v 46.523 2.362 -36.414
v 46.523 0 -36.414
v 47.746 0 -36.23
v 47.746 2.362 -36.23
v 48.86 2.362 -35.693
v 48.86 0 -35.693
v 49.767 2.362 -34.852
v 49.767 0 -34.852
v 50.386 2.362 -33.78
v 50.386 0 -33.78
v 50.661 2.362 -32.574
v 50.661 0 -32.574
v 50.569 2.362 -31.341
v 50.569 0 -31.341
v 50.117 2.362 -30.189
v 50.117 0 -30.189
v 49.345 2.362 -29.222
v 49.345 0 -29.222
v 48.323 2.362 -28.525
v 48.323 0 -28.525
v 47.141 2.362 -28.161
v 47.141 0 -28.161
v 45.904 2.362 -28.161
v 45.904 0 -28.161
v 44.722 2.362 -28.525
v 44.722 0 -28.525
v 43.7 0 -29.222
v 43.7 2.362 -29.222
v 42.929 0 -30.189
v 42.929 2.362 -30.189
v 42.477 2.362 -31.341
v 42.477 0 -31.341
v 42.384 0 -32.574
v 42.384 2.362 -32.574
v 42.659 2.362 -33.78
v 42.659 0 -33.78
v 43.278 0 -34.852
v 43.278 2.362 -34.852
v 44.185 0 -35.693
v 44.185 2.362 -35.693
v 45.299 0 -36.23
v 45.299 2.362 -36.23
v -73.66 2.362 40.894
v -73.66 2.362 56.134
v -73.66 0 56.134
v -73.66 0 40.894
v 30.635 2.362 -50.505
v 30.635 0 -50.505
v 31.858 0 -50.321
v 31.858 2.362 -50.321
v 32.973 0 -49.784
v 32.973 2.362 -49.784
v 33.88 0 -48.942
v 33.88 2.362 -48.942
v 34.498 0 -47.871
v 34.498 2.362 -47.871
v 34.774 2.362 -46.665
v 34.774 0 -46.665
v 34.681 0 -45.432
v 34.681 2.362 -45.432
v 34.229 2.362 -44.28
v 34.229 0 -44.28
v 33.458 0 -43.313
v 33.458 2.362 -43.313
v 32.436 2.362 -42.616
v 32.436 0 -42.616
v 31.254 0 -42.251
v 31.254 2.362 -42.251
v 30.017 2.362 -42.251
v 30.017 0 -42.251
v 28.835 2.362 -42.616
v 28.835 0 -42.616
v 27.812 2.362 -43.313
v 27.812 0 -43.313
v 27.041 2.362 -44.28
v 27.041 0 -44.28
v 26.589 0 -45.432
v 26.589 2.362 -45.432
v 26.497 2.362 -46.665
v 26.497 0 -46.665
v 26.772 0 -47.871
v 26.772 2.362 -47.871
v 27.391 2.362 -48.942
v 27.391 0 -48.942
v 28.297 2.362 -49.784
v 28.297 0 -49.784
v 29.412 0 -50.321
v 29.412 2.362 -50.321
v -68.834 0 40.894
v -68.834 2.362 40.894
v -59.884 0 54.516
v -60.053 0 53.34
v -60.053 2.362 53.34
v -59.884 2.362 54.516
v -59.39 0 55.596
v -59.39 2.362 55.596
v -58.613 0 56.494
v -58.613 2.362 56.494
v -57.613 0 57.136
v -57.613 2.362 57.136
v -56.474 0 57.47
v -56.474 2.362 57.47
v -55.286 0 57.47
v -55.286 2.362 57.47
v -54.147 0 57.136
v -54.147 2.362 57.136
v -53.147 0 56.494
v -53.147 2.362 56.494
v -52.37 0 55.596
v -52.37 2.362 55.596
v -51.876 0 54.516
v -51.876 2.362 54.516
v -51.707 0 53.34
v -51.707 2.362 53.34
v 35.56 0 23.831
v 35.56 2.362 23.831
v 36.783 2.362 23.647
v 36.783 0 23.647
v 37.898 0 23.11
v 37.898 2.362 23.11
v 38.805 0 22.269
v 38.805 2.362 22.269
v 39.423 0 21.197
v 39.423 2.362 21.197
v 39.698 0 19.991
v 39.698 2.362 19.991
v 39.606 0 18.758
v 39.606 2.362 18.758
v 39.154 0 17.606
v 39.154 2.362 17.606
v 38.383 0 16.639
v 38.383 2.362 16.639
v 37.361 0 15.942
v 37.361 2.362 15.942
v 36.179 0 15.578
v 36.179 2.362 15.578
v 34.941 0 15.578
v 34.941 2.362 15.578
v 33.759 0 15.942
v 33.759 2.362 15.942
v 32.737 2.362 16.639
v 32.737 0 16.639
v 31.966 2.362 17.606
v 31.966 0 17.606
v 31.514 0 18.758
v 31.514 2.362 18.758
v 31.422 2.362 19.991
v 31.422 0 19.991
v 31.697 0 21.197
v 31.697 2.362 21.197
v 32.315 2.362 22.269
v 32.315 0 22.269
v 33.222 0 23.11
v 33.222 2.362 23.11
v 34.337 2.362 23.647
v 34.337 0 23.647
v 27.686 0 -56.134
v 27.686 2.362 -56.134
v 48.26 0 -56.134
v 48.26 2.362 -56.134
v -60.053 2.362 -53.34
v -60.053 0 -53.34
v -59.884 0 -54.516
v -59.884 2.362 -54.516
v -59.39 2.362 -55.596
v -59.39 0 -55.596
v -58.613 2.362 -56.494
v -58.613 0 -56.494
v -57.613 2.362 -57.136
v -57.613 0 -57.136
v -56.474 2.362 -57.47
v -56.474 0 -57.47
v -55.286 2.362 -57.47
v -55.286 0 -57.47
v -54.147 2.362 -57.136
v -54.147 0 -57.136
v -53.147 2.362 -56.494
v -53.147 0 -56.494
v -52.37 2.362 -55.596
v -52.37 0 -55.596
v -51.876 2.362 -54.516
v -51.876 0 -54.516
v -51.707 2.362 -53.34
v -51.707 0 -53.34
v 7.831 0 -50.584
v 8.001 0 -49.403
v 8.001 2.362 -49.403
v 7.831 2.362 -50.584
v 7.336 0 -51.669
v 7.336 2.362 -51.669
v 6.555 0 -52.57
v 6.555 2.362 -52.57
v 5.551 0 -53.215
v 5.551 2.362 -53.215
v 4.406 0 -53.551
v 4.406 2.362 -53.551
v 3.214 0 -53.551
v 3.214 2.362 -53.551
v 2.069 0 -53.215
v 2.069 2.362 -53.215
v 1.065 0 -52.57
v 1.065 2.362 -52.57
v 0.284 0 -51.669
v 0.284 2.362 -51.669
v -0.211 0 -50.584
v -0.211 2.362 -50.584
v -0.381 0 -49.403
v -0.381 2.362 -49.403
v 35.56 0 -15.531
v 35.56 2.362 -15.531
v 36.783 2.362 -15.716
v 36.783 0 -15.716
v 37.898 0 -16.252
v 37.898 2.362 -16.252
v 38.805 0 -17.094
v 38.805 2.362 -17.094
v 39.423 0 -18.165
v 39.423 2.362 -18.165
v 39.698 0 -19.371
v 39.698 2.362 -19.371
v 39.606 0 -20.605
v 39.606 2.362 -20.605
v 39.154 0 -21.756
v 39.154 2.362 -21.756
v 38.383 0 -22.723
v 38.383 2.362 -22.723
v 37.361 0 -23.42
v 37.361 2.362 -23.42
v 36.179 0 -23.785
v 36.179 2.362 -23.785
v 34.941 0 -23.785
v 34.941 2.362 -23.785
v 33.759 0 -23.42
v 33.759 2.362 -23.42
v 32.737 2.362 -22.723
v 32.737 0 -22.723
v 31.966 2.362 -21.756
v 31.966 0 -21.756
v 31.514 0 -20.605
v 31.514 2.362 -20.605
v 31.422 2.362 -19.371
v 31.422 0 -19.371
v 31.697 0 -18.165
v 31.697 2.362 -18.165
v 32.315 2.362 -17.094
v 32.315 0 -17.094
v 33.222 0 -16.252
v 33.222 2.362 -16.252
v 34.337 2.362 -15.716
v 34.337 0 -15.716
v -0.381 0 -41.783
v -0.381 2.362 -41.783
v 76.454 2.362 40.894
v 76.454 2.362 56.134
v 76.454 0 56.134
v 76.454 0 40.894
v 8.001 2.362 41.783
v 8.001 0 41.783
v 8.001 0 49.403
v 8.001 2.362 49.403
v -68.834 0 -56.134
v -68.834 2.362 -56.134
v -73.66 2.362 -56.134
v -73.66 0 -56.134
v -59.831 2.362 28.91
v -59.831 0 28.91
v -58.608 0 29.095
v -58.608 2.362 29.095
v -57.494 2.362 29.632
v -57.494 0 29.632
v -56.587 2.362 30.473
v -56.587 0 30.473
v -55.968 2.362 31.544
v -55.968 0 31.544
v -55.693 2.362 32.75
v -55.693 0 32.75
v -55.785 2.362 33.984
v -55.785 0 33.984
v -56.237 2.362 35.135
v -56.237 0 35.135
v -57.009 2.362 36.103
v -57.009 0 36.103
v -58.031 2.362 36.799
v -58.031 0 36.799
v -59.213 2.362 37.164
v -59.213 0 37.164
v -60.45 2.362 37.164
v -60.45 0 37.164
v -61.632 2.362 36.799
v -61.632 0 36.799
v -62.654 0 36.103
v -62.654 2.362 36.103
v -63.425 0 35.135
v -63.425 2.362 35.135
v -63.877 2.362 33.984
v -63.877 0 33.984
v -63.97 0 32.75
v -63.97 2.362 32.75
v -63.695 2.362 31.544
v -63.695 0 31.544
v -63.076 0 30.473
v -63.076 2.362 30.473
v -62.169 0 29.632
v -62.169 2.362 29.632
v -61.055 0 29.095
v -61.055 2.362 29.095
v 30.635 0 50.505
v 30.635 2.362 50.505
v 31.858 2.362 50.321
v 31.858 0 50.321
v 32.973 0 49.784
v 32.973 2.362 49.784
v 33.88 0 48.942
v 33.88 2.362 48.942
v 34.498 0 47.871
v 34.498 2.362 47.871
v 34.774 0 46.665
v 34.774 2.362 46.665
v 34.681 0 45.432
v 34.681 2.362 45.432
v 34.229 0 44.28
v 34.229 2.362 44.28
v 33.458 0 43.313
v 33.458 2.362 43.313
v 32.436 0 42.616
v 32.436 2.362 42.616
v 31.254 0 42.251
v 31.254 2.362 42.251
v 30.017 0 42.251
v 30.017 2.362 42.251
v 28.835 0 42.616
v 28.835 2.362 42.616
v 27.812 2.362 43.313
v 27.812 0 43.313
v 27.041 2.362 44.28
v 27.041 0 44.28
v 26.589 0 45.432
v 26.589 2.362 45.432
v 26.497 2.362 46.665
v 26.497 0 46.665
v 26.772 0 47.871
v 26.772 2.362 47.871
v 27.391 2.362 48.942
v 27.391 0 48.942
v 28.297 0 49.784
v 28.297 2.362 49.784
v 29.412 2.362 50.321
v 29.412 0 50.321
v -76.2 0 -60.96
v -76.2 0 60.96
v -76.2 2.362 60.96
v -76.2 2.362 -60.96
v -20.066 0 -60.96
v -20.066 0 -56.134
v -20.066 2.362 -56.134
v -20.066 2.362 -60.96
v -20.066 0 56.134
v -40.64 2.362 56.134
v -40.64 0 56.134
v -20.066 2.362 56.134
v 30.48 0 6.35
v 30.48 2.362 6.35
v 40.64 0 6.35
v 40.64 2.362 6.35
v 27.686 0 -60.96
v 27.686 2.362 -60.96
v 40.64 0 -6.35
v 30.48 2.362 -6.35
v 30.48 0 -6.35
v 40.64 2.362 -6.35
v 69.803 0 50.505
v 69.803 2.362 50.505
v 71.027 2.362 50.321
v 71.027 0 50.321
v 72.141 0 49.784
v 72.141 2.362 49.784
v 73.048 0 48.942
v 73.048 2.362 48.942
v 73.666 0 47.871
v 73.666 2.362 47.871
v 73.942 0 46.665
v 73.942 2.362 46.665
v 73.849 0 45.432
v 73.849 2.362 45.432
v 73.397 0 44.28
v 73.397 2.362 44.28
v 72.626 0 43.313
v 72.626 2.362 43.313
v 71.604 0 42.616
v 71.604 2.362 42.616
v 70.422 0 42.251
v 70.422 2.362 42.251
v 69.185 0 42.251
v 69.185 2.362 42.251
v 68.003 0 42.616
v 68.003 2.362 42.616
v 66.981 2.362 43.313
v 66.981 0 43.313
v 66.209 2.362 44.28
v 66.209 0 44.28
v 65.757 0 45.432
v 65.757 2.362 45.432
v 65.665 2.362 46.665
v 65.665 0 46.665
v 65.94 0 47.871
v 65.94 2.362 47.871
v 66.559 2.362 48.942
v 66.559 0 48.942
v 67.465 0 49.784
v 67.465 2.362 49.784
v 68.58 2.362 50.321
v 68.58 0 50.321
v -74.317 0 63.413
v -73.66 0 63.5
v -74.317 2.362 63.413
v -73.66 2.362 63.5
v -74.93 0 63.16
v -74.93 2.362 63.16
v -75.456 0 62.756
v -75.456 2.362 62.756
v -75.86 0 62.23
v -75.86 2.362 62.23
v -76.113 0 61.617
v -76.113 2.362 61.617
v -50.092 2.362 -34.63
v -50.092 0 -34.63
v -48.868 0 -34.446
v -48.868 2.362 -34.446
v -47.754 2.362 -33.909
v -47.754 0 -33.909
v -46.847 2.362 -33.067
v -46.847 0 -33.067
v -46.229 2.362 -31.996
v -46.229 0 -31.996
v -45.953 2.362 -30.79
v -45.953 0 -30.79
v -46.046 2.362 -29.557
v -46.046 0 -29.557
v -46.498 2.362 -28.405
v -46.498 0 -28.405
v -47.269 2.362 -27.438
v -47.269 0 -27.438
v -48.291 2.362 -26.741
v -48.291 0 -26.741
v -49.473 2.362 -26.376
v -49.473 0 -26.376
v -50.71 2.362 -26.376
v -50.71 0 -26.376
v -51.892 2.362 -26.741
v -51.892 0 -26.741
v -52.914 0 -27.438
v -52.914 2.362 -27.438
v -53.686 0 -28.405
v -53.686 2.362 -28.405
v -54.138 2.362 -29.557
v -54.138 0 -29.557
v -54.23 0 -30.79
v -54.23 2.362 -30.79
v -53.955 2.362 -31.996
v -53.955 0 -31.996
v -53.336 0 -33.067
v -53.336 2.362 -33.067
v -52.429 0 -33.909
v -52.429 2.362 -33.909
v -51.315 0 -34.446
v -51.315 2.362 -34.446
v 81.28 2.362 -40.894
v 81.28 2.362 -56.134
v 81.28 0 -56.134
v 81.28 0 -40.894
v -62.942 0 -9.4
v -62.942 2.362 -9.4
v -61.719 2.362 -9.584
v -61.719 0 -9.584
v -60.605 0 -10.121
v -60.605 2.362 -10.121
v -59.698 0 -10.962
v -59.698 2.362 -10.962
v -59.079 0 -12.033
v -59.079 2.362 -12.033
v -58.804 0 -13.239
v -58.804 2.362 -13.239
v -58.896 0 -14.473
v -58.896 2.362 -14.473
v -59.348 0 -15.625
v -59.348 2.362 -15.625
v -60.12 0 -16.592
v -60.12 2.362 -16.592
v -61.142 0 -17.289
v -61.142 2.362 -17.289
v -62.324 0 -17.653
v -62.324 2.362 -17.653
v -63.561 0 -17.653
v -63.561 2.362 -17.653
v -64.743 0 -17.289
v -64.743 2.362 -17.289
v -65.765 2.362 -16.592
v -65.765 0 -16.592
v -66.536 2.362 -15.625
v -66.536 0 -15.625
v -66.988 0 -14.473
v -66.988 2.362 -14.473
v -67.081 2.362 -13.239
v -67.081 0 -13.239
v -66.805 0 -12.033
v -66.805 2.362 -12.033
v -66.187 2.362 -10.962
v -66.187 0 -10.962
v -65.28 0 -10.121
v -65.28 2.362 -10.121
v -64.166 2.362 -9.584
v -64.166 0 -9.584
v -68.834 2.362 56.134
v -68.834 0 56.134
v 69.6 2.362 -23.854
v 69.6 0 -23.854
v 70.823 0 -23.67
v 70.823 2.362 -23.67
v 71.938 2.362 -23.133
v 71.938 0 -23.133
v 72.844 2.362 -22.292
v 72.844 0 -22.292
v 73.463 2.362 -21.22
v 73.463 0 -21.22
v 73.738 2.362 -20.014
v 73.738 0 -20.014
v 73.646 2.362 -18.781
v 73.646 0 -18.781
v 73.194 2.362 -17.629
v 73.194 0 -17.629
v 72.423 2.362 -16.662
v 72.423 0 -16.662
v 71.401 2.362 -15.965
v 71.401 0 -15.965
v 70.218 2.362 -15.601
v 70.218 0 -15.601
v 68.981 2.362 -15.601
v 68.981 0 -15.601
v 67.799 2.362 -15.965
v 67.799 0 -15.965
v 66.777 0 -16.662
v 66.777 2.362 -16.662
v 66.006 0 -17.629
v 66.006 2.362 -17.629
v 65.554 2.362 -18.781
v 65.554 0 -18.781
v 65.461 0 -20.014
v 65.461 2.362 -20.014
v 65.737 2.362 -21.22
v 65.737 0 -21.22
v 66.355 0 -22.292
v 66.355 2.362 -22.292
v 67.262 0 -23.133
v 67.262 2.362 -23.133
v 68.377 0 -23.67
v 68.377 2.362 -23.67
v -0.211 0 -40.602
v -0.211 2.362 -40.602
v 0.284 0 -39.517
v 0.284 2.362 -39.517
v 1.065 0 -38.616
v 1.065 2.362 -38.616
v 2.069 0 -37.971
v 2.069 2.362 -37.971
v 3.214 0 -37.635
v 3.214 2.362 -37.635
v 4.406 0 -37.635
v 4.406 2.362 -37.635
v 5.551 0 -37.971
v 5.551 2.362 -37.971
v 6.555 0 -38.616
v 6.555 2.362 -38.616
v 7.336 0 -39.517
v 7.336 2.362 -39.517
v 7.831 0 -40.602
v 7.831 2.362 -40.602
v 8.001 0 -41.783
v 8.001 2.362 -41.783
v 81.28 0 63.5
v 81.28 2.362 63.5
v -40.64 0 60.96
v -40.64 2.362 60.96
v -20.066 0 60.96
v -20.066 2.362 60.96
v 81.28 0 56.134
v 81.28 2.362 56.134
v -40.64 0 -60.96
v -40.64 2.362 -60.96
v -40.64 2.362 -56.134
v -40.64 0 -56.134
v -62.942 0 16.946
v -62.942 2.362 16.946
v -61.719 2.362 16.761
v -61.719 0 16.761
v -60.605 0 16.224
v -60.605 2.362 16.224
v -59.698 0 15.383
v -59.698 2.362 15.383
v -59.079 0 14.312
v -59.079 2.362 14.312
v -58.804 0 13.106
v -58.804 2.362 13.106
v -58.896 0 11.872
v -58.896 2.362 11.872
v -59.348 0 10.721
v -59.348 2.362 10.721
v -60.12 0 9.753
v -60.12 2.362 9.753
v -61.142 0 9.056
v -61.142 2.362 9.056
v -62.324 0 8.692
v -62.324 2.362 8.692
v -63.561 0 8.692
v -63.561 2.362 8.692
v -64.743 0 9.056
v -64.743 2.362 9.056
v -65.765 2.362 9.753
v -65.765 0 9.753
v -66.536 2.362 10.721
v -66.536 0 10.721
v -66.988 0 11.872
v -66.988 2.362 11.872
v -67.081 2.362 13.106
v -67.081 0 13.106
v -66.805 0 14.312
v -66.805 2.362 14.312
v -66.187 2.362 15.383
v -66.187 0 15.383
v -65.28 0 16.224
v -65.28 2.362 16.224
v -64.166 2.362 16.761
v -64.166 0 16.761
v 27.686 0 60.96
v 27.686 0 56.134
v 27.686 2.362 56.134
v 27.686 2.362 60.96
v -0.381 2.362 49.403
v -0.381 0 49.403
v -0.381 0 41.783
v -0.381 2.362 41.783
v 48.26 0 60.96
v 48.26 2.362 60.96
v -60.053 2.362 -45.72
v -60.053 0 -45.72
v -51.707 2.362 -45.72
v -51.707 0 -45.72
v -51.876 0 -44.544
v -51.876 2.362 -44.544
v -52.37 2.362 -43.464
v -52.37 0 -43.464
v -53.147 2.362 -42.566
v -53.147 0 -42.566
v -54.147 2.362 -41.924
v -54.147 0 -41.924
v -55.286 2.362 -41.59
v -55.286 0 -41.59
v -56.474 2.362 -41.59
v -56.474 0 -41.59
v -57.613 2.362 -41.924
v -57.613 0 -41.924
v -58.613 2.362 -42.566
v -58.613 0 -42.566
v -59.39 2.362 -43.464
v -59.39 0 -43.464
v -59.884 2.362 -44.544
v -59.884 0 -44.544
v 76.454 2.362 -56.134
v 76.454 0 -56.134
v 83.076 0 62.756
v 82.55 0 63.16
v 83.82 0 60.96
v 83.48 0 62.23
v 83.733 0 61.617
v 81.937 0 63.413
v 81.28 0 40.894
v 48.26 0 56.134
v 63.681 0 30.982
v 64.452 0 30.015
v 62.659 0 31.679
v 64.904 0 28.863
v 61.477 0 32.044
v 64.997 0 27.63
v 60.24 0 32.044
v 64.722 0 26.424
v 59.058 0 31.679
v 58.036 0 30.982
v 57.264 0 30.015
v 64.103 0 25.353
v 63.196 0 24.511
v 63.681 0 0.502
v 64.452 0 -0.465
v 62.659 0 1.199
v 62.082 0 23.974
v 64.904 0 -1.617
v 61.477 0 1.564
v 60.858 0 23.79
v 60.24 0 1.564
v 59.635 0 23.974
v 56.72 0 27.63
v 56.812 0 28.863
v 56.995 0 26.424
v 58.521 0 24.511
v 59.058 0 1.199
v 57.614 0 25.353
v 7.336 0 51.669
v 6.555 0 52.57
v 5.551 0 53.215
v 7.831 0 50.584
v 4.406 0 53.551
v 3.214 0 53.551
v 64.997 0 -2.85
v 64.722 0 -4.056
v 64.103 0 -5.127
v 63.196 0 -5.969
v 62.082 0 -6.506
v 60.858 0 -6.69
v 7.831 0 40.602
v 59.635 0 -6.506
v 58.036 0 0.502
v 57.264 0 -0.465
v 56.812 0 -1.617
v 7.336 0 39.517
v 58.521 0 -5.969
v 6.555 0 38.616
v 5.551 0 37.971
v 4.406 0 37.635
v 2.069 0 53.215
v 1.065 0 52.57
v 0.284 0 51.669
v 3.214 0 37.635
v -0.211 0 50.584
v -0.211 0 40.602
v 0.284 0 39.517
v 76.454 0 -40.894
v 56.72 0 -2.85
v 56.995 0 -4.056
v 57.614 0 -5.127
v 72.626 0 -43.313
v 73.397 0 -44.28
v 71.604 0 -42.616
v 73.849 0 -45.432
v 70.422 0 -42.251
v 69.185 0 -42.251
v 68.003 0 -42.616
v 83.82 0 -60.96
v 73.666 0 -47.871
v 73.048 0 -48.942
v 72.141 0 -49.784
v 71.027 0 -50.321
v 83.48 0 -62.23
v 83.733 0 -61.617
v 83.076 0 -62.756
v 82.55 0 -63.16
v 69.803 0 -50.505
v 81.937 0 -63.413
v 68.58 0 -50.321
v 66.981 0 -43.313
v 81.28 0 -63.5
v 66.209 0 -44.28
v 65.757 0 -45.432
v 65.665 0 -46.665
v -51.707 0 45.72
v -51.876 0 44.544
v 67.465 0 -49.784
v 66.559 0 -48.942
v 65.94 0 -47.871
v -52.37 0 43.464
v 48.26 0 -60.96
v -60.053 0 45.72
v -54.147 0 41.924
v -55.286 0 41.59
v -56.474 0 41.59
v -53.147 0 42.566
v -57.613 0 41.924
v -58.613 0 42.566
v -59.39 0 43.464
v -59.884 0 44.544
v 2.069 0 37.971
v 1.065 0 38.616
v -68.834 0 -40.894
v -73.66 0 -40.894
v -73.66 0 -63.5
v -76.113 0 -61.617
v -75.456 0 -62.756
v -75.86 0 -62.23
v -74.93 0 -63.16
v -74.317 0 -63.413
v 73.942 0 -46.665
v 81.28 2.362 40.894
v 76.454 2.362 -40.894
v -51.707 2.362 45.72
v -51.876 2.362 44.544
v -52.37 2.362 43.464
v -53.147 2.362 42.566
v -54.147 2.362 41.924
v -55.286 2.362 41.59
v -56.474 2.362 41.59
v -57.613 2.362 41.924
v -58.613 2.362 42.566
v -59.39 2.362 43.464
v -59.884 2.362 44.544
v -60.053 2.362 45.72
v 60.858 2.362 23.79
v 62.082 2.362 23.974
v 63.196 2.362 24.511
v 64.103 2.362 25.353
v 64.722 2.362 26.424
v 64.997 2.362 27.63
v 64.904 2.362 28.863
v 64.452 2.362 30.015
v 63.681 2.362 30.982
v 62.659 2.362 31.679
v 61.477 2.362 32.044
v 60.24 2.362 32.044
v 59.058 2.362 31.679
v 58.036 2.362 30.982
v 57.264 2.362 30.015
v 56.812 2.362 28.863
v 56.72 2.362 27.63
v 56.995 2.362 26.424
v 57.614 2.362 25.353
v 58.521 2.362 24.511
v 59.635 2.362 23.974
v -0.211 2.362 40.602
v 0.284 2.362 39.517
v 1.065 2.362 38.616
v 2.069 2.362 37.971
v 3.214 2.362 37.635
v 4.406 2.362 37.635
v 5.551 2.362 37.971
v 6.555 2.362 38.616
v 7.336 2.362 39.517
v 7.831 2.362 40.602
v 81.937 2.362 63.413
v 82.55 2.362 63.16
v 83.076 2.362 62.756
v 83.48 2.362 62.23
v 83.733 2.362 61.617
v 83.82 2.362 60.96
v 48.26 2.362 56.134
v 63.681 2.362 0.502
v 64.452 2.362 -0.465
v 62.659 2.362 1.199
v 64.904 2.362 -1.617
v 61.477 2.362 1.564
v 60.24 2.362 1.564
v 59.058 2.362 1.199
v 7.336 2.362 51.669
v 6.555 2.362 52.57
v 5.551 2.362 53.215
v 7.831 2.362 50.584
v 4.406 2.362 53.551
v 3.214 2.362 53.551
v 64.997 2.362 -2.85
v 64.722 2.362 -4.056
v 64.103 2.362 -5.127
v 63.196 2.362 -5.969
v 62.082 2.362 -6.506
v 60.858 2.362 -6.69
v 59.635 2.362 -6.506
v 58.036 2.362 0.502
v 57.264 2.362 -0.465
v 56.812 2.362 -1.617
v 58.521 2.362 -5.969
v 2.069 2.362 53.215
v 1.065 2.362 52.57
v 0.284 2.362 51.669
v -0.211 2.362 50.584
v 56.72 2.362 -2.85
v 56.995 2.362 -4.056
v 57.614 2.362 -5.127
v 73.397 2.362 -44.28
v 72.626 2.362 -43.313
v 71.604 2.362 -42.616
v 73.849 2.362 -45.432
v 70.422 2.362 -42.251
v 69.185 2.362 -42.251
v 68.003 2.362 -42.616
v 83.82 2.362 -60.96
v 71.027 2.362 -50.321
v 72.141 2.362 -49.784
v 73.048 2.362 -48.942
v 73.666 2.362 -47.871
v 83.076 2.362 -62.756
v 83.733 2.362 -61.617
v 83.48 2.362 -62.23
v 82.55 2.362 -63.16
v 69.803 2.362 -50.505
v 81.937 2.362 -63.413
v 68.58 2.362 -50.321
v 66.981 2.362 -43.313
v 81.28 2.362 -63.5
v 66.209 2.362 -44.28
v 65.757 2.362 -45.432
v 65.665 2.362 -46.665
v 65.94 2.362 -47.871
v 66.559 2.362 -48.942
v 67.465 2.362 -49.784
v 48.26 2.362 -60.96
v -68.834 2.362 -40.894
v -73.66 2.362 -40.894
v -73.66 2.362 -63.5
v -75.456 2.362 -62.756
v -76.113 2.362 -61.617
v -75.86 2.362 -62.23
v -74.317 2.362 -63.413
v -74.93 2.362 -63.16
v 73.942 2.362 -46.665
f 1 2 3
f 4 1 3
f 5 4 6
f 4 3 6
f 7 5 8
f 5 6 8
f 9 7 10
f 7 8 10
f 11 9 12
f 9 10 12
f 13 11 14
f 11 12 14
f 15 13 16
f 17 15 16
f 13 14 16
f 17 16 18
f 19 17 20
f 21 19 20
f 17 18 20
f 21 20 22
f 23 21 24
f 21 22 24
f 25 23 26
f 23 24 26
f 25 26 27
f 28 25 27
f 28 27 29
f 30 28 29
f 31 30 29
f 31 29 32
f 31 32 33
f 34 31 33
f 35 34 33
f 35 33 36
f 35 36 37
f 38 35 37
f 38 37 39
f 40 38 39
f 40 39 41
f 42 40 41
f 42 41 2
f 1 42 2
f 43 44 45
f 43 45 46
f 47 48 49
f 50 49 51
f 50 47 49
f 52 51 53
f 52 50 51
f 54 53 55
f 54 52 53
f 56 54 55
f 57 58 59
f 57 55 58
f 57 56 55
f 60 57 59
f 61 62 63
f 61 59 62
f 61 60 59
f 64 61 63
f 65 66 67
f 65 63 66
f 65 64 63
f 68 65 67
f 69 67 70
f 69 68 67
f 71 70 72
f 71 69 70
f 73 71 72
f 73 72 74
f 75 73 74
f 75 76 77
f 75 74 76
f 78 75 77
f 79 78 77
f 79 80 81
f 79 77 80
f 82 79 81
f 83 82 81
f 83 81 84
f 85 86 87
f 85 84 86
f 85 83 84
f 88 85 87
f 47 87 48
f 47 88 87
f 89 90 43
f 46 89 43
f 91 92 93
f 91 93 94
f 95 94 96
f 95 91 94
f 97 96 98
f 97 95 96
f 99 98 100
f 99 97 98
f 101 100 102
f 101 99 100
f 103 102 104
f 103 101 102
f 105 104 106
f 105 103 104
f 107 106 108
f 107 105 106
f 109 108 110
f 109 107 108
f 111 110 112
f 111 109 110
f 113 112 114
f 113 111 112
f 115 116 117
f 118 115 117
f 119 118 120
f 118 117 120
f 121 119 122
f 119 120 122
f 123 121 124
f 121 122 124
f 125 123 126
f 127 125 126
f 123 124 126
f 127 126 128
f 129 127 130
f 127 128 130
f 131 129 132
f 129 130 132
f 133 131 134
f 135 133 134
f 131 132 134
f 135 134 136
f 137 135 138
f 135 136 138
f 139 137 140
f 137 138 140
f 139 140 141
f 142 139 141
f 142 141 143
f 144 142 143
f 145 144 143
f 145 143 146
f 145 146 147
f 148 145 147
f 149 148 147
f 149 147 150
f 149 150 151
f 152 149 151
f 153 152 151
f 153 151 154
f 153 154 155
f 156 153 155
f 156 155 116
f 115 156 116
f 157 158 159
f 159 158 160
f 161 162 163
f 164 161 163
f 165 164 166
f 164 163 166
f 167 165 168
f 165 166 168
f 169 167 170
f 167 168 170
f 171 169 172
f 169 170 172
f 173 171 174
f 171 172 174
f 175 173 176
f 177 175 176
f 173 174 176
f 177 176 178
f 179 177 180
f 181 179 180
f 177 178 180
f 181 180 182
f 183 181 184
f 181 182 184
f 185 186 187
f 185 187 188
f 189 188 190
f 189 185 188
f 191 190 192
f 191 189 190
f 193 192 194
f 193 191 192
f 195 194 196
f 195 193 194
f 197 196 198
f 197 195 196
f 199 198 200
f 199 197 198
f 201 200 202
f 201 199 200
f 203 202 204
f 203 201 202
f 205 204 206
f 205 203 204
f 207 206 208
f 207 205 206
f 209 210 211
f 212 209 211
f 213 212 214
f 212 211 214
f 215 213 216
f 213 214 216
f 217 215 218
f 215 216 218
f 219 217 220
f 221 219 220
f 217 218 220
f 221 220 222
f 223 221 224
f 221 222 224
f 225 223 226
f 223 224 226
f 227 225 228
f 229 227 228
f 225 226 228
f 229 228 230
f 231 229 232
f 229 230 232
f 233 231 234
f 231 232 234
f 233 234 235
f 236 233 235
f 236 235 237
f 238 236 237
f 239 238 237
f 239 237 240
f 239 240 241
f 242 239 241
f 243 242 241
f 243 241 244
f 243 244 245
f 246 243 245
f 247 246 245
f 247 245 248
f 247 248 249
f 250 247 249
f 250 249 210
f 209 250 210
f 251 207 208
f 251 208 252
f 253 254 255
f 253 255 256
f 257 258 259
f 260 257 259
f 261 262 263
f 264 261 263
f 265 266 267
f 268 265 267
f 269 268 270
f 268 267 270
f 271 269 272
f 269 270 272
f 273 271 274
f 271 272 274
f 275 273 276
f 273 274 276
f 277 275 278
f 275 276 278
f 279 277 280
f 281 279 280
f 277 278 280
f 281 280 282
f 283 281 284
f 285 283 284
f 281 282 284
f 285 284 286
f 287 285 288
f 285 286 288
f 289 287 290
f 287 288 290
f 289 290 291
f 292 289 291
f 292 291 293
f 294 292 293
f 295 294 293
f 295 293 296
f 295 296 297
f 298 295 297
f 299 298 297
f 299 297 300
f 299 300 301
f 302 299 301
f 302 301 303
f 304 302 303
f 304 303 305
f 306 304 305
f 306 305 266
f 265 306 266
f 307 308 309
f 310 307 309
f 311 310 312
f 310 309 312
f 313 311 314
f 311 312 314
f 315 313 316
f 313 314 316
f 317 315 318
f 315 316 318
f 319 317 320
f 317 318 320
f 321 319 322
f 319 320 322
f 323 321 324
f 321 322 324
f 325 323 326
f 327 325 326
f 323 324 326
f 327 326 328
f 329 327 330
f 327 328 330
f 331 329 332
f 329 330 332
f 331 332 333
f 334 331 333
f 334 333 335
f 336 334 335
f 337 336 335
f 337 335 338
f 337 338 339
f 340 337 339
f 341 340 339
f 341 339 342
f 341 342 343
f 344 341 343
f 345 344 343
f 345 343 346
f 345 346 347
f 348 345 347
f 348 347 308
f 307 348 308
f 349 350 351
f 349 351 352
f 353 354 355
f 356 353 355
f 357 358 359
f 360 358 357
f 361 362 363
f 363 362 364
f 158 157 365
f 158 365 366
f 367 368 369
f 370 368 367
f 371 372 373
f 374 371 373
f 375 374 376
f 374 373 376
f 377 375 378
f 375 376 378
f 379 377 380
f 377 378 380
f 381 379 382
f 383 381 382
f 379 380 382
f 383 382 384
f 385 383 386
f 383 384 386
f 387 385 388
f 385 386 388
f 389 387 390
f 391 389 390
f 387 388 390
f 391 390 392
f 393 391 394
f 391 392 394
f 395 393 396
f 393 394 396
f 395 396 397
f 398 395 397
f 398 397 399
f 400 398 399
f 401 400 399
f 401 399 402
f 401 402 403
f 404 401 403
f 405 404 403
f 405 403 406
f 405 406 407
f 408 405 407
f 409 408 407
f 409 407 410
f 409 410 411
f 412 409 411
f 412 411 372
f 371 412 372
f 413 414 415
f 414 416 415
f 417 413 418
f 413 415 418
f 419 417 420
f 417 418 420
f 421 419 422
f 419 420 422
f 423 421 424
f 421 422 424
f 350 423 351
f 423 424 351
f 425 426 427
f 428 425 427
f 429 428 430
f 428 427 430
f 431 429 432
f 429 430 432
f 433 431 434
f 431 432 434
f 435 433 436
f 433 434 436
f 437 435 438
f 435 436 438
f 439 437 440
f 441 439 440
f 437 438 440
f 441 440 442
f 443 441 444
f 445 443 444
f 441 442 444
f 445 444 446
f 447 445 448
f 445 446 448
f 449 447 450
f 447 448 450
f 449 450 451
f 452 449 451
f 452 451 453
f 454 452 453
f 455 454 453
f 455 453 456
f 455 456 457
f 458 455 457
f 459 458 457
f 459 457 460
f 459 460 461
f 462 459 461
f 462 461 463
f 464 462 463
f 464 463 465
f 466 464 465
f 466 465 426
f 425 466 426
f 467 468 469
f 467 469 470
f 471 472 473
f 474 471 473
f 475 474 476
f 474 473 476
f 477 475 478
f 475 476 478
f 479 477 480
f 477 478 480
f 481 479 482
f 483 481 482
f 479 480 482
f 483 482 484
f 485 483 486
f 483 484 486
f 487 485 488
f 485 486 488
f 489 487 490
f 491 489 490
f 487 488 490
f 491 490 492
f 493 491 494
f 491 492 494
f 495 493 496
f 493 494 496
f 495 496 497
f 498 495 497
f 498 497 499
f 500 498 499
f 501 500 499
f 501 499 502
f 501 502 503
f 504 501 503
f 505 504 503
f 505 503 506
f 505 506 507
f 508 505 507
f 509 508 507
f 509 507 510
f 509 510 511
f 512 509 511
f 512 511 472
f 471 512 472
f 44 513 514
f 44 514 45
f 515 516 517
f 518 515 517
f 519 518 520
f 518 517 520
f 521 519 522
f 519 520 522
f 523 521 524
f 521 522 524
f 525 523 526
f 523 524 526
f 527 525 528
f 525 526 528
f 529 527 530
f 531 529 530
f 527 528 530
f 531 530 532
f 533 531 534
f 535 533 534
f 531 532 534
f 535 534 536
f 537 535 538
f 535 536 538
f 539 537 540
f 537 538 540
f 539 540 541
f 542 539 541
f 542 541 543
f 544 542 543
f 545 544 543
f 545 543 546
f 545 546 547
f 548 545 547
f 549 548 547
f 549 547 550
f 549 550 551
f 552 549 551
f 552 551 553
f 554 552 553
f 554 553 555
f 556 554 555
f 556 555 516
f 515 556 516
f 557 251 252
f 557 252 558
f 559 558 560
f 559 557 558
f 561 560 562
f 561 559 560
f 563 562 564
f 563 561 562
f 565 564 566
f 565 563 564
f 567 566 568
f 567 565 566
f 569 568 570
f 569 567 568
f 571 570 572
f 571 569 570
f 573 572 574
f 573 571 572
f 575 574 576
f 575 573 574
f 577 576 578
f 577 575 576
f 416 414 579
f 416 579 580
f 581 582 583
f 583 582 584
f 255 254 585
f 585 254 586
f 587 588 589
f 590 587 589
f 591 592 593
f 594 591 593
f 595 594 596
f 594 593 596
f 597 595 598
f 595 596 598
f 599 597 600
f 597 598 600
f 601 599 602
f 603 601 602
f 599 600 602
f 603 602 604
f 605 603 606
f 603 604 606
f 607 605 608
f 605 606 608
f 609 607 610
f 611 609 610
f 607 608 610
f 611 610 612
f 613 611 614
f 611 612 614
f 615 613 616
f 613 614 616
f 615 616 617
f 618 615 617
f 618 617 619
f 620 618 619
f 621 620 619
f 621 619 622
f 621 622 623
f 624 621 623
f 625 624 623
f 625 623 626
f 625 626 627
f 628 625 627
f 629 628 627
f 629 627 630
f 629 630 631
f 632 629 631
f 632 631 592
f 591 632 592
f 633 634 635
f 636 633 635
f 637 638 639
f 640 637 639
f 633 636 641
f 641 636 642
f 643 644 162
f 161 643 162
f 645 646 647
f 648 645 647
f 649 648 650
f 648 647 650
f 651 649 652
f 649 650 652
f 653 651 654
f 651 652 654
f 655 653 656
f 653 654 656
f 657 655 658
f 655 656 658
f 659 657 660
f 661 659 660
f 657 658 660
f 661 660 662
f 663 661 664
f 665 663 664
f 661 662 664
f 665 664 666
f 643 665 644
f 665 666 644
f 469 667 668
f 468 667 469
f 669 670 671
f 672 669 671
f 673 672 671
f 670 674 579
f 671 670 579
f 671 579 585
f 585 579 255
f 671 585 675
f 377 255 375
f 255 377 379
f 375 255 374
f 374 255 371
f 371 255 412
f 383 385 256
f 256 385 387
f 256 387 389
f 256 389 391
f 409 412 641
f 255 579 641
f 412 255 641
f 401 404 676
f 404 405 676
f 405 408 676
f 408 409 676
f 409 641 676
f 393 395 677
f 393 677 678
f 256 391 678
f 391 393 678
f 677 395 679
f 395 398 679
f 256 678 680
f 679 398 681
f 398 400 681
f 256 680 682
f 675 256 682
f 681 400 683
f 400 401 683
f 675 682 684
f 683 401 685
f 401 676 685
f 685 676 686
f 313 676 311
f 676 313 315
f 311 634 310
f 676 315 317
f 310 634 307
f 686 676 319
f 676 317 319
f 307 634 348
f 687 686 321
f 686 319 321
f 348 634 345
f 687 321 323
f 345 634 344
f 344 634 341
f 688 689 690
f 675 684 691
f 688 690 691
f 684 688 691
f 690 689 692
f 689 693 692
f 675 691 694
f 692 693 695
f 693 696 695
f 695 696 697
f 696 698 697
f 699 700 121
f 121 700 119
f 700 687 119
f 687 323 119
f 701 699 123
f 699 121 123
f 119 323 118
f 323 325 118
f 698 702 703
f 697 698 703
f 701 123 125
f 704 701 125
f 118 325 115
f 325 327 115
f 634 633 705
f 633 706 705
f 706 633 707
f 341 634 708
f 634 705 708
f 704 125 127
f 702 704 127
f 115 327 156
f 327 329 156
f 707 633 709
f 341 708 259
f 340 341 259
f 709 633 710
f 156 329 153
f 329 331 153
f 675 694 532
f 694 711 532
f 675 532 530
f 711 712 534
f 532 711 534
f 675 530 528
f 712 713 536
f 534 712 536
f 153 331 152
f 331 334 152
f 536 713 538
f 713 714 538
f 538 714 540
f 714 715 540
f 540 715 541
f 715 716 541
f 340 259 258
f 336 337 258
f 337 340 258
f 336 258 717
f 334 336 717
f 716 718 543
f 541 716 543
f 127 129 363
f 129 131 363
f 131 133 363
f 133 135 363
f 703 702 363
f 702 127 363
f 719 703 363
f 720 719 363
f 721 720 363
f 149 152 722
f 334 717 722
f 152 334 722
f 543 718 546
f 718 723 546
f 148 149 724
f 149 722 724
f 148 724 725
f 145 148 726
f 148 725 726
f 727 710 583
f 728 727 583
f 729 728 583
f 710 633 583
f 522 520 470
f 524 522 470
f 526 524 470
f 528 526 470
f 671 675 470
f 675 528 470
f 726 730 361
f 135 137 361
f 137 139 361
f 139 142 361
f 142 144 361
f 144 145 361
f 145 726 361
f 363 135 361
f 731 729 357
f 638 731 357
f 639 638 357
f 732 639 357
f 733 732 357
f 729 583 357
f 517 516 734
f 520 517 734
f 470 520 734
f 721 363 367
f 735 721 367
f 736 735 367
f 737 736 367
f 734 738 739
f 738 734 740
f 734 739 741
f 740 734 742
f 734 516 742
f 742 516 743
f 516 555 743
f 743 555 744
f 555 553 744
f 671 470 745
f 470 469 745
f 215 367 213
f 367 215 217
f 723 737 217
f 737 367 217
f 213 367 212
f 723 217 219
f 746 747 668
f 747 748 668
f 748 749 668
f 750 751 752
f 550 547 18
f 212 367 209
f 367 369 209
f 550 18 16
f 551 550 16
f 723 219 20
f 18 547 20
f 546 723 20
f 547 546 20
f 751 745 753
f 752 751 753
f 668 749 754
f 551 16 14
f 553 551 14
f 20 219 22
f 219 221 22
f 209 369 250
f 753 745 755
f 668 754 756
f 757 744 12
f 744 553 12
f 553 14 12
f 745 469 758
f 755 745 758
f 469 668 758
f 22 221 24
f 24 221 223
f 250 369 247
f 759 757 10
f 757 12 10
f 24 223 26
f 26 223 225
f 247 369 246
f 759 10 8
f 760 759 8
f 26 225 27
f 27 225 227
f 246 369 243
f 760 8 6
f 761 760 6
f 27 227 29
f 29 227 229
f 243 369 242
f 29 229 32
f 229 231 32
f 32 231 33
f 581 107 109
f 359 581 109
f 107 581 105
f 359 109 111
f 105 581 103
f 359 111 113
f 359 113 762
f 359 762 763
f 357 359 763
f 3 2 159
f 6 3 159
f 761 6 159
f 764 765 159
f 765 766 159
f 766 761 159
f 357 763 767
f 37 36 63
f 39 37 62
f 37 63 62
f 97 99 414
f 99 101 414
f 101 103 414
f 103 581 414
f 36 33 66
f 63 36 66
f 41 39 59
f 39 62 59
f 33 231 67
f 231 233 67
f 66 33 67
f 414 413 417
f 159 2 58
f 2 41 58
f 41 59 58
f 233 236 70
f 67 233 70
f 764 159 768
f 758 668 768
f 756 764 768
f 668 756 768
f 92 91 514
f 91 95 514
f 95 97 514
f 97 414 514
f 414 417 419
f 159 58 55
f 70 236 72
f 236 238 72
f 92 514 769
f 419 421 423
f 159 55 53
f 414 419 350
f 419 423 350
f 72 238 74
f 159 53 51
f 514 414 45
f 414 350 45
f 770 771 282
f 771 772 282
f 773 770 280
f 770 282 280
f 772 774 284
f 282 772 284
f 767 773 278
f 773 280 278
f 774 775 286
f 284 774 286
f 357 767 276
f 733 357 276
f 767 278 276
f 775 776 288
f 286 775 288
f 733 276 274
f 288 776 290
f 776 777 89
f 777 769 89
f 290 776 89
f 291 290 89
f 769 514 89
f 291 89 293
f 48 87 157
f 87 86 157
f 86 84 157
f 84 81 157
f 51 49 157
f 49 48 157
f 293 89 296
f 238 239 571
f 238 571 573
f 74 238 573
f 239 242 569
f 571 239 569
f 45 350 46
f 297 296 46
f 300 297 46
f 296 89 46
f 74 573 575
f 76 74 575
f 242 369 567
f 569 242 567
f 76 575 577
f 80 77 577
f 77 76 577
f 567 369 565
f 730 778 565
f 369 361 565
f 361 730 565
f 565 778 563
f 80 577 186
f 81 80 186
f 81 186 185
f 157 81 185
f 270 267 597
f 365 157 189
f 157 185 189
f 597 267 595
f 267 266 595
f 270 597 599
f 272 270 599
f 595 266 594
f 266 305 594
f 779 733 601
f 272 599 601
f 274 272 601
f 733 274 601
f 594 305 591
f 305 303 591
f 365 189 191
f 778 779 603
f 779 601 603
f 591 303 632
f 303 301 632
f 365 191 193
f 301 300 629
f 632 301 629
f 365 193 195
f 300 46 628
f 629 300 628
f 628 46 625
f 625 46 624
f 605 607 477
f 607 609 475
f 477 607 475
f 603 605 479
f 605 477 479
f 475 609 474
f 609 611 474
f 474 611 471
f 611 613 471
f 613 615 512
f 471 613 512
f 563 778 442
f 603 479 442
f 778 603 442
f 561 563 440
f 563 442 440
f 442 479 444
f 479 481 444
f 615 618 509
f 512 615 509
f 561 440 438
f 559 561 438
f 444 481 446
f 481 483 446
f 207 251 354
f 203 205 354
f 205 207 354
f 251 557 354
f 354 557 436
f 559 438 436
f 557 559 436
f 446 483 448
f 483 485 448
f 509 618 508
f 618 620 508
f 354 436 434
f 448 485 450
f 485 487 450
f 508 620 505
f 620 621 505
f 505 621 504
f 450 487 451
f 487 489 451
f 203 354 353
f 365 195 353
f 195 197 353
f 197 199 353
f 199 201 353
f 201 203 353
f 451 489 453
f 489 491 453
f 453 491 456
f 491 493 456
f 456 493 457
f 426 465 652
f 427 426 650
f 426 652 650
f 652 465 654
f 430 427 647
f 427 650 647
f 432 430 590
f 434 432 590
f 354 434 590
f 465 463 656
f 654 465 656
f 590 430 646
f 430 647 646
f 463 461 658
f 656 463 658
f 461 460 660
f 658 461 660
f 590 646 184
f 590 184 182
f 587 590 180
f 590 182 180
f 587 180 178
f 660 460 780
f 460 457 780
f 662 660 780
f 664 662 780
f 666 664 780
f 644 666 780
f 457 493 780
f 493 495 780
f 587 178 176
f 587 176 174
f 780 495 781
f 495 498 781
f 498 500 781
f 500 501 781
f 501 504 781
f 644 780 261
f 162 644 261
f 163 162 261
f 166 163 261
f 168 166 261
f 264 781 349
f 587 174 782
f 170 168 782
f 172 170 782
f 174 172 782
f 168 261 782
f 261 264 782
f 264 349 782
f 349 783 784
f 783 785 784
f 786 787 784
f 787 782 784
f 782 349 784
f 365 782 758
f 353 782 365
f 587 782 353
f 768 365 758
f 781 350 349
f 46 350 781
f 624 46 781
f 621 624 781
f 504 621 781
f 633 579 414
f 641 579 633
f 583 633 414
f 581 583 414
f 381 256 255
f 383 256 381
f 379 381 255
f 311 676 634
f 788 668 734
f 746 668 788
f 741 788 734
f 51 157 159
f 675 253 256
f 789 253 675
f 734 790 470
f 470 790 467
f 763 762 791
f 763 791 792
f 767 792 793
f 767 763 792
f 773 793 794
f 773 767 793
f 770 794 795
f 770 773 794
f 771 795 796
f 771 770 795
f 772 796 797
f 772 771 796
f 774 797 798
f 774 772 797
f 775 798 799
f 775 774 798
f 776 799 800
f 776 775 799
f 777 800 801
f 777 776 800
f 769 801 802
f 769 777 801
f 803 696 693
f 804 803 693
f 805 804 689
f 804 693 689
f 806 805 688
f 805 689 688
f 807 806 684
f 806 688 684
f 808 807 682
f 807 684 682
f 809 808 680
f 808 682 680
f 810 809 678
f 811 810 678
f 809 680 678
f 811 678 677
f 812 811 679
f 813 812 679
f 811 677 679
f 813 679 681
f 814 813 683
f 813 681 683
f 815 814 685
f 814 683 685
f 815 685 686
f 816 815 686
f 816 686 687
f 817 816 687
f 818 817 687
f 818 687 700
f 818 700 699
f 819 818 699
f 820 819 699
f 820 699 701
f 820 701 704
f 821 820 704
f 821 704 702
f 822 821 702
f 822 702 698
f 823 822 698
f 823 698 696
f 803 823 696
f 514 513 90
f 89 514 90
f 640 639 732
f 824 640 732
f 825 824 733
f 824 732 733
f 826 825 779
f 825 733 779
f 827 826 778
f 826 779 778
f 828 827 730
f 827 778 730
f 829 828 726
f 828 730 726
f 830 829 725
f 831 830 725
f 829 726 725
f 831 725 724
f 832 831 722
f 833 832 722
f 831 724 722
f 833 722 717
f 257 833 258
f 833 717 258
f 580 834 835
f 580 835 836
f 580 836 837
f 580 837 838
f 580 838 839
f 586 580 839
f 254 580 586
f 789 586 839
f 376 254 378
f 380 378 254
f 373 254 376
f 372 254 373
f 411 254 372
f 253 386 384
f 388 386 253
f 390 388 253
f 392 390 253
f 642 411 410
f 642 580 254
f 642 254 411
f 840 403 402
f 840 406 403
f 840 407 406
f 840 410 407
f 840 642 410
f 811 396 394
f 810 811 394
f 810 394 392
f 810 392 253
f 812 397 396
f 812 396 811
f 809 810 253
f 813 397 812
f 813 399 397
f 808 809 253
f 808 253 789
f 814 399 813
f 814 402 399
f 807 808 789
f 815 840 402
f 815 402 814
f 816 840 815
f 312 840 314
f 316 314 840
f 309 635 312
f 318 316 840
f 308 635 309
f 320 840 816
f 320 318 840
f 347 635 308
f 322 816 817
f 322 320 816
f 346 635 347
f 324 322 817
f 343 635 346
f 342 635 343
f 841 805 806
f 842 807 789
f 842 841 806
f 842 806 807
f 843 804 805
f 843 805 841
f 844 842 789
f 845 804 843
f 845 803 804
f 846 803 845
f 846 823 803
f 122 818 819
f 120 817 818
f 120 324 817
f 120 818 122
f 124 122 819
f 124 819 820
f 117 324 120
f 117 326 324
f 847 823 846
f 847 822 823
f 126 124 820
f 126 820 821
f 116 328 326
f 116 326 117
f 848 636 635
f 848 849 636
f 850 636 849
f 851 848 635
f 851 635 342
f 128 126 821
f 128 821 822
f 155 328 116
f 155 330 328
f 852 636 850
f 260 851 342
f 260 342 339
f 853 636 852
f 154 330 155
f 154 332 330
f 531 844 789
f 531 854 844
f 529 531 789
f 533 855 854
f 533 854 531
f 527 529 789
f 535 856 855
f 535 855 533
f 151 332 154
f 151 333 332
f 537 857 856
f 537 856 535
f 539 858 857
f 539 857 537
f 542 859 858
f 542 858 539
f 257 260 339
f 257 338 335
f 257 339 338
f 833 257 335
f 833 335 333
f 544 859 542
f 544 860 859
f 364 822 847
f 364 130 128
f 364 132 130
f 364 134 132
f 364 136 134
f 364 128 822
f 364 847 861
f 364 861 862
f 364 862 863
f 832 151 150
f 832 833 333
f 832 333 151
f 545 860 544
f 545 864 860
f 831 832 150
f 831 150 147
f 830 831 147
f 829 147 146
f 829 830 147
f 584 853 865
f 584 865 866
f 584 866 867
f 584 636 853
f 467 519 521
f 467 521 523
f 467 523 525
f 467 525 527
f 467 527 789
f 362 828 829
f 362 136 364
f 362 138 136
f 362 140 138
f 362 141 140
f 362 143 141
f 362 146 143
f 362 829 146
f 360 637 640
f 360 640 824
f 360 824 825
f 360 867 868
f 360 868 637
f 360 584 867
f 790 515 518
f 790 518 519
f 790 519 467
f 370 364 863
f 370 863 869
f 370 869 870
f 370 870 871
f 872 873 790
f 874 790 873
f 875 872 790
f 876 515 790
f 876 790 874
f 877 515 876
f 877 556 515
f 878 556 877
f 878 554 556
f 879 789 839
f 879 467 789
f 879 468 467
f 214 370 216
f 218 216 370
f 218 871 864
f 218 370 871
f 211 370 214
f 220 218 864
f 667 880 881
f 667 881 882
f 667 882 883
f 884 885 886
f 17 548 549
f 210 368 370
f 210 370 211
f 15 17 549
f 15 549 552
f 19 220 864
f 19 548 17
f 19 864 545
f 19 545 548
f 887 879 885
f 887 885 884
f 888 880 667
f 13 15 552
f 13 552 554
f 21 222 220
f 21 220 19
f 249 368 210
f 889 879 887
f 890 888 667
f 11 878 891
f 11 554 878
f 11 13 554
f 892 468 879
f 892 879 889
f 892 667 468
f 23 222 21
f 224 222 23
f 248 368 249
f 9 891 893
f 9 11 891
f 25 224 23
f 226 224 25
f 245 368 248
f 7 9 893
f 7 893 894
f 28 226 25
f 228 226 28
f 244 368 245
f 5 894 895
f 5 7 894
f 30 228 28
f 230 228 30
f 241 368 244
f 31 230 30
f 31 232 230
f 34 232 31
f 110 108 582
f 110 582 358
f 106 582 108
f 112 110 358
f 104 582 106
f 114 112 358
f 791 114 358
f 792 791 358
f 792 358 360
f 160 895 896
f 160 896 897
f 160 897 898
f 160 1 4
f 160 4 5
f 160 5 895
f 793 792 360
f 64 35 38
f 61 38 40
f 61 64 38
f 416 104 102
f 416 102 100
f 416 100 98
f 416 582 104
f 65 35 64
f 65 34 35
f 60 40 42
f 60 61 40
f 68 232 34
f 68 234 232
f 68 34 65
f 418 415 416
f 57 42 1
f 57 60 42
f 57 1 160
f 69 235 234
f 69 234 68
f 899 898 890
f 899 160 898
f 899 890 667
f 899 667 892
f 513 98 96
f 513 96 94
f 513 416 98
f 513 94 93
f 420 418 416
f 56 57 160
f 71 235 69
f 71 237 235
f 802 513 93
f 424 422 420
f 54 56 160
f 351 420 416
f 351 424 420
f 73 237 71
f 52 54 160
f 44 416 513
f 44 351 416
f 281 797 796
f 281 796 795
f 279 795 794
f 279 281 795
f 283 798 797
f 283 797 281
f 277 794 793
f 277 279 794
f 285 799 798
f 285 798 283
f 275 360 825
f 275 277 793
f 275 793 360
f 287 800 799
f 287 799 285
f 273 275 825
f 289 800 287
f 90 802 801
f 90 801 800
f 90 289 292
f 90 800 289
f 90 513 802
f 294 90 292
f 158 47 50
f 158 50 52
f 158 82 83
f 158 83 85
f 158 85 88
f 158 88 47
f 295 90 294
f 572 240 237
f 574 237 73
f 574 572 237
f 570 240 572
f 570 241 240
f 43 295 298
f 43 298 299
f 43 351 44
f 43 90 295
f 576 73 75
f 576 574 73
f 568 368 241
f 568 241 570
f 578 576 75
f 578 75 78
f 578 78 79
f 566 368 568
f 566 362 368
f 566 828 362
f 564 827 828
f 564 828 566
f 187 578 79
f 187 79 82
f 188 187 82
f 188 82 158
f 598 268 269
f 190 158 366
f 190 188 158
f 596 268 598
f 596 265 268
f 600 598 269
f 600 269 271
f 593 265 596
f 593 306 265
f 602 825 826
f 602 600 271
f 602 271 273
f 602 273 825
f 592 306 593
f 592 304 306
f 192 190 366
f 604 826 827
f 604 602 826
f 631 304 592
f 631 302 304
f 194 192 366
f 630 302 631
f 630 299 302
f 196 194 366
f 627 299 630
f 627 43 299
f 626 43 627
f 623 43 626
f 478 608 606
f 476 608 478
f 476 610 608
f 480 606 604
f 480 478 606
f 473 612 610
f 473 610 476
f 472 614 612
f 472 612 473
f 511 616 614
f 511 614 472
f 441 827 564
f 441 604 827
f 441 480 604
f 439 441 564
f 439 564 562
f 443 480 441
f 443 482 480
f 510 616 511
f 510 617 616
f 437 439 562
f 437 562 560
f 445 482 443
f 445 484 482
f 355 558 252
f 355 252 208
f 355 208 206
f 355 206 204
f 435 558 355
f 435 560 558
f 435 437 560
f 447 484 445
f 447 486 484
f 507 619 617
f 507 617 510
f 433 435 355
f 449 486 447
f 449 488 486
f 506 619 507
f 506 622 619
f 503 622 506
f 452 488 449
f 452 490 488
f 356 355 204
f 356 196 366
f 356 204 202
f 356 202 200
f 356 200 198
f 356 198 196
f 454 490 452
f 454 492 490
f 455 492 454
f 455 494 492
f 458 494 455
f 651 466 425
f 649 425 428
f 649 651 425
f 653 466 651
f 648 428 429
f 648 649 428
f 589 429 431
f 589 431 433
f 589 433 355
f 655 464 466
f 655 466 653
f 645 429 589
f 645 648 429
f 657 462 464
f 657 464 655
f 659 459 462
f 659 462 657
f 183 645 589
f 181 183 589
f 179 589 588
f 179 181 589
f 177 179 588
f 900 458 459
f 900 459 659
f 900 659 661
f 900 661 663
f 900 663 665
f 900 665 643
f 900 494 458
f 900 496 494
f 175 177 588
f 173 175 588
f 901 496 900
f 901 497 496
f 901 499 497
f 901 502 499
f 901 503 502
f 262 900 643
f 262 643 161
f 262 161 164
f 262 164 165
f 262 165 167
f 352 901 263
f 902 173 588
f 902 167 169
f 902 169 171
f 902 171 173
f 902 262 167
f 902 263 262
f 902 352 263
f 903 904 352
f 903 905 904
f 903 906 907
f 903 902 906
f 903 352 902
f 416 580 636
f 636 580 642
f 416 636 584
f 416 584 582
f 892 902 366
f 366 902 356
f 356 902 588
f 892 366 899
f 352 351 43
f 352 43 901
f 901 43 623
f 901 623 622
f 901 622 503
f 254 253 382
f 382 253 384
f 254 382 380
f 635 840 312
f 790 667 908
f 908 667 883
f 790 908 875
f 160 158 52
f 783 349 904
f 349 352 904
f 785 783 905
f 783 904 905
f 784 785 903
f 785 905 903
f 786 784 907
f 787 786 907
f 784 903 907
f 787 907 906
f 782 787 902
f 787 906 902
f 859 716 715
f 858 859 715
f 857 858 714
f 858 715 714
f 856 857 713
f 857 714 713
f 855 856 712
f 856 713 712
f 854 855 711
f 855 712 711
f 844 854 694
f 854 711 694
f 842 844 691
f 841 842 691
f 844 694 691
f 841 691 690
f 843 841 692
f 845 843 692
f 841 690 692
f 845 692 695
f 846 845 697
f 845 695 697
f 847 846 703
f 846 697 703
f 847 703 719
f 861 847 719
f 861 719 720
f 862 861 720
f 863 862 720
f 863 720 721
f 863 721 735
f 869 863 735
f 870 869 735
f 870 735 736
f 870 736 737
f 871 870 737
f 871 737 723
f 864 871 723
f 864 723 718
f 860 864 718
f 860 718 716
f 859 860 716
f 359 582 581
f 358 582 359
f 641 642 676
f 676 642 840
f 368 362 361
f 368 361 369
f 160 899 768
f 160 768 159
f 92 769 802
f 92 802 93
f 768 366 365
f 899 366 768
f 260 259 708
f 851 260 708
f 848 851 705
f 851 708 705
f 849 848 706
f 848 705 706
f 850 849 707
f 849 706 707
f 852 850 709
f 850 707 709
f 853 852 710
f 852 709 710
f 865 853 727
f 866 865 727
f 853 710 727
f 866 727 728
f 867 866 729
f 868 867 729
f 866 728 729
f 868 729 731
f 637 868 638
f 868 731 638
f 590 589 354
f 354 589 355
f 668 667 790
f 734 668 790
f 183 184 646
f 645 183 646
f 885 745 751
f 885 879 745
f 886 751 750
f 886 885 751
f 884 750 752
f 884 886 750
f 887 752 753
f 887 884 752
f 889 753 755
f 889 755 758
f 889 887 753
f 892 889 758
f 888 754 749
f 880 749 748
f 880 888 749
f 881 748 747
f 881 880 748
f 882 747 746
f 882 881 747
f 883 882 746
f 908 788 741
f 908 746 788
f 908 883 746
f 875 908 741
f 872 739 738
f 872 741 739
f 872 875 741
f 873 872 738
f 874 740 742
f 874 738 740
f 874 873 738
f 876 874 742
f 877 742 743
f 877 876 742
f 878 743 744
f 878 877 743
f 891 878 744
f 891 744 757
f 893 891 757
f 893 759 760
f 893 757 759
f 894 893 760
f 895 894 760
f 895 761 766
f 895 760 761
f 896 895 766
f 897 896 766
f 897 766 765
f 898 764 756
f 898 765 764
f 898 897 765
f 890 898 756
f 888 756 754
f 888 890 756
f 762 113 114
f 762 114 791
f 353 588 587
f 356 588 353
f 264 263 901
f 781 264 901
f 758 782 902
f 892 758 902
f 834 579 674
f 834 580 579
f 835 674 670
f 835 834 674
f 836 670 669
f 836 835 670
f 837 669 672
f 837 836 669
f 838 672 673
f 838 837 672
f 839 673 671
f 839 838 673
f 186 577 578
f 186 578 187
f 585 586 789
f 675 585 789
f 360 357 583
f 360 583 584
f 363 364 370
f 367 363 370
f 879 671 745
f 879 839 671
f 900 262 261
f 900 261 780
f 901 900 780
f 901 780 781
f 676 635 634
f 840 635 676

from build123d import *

# Parameters (mm, degrees)
SKETCH1_W                = 152.4
SKETCH1_H                = 127
BOSS_EXTRUDE1_DEPTH      = 2.3622
SKETCH9_R                = 4.15
CUT_EXTRUDE8_DEPTH       = 100.218294628
SKETCH16_R               = 4.15
CUT_EXTRUDE14_DEPTH      = 100.218294628
SKETCH26_W               = 10.16
SKETCH26_H               = 12.7
CUT_EXTRUDE26_DEPTH      = 100.218294628
SKETCH27_R               = 4.15
CUT_EXTRUDE27_DEPTH      = 100.218294628
SKETCH29_R               = 4.15
CUT_EXTRUDE28_DEPTH      = 100.218294628
SKETCH30_R               = 4.15
CUT_EXTRUDE29_DEPTH      = 100.218294628
SKETCH31_R               = 4.15
CUT_EXTRUDE30_DEPTH      = 100.218294628
SKETCH34_W               = 127
SKETCH34_H               = 2.3622
BOSS_EXTRUDE2_DEPTH      = 7.62
SKETCH38_W               = 88.9
SKETCH38_H               = 4.826
CUT_EXTRUDE34_DEPTH      = 7.62
SKETCH39_W               = 4.826
SKETCH39_H               = 15.24
CUT_EXTRUDE35_DEPTH      = 7.62
MIRROR15_COPY_1_SKETCH_W = 4.826
MIRROR15_COPY_1_SKETCH_H = 15.24
MIRROR15_COPY_1_DEPTH    = 7.62
CUT_EXTRUDE12_DEPTH      = 106.183755347
SKETCH40_W               = 47.752
SKETCH40_H               = 2.3622
BOSS_EXTRUDE3_DEPTH      = 4.826
FILLET2_R                = 2.54


with BuildPart() as part:
    # Sketch1 → Boss-Extrude1 (new body)
    with BuildSketch(Plane(origin=(0, 0, 0), x_dir=(1, 0, 0), z_dir=(0, 1, 0))):
        Rectangle(SKETCH1_W, SKETCH1_H)
    extrude(amount=BOSS_EXTRUDE1_DEPTH)

    # Sketch9 → Cut-Extrude8 (cut, through all)
    with BuildSketch(Plane.XZ):
        with Locations(Location((60.8584, 27.94, 0), (0, 0, 270))):
            Circle(SKETCH9_R)
        with Locations(Location((60.8584, -2.54, 0), (0, 0, 270))):
            Circle(SKETCH9_R)
    extrude(amount=-CUT_EXTRUDE8_DEPTH, mode=Mode.SUBTRACT)

    # Sketch16 → Cut-Extrude14 (cut, through all)
    with BuildSketch(Plane(origin=(0, 0, 0), x_dir=(-1, 0, 0), z_dir=(0, -1, 0))):
        with Locations(Location((-69.599893995, 19.704320306, 0), (0, 0, 90))):
            Circle(SKETCH16_R)
        with Locations(Location((-46.522565834, 32.264238523, 0), (0, 0, 90))):
            Circle(SKETCH16_R)
    extrude(amount=-CUT_EXTRUDE14_DEPTH, mode=Mode.SUBTRACT)

    # Sketch26 → Cut-Extrude26 (cut, through all)
    with BuildSketch(Plane(origin=(0, 2.3622, 0), x_dir=(1, 0, 0), z_dir=(0, 1, 0))):
        with Locations((35.56, 0)):
            Rectangle(SKETCH26_W, SKETCH26_H)
    extrude(amount=-CUT_EXTRUDE26_DEPTH, mode=Mode.SUBTRACT)

    # Sketch27 → Cut-Extrude27 (cut, through all)
    with BuildSketch(Plane.XZ):
        with Locations(Location((-59.831398438, 33.060447312, 0), (0, 0, 270))):
            Circle(SKETCH27_R)
        with Locations(Location((-50.09170874, -30.48, 0), (0, 0, 270))):
            Circle(SKETCH27_R)
    extrude(amount=-CUT_EXTRUDE27_DEPTH, mode=Mode.SUBTRACT)

    # Sketch29 → Cut-Extrude28 (cut, through all)
    with BuildSketch(Plane(origin=(0, 2.3622, 0), x_dir=(1, 0, 0), z_dir=(0, 1, 0))):
        with Locations(Location((35.56, 19.681240592, 0), (0, 0, 270))):
            Circle(SKETCH29_R)
        with Locations(Location((35.56, -19.681240592, 0), (0, 0, 270))):
            Circle(SKETCH29_R)
    extrude(amount=-CUT_EXTRUDE28_DEPTH, mode=Mode.SUBTRACT)

    # Sketch30 → Cut-Extrude29 (cut, through all)
    with BuildSketch(Plane(origin=(0, 2.3622, 0), x_dir=(1, 0, 0), z_dir=(0, 1, 0))):
        with Locations(Location((69.803274088, -46.355, 0), (0, 0, 270))):
            Circle(SKETCH30_R)
        with Locations(Location((30.63517528, -46.355, 0), (0, 0, 270))):
            Circle(SKETCH30_R)
    cut_extrude29 = extrude(amount=-CUT_EXTRUDE29_DEPTH, mode=Mode.SUBTRACT)

    # Mirror8: Cut-Extrude29 across plane
    add(cut_extrude29.mirror(Plane.XY), mode=Mode.SUBTRACT)

    # Sketch31 → Cut-Extrude30 (cut, through all)
    with BuildSketch(Plane(origin=(0, 2.3622, 0), x_dir=(1, 0, 0), z_dir=(0, 1, 0))):
        with Locations(Location((-62.942335235, -12.79551579, 0), (0, 0, 270))):
            Circle(SKETCH31_R)
        with Locations(Location((-62.942335235, 13.549600091, 0), (0, 0, 270))):
            Circle(SKETCH31_R)
    extrude(amount=-CUT_EXTRUDE30_DEPTH, mode=Mode.SUBTRACT)

    # Sketch34 → Boss-Extrude2 (add)
    with BuildSketch(Plane(origin=(76.2, 0, 0), x_dir=(0, 0, -1), z_dir=(1, 0, 0))):
        with Locations((0, 1.1811)):
            Rectangle(SKETCH34_W, SKETCH34_H)
    extrude(amount=BOSS_EXTRUDE2_DEPTH)

    # Sketch38 → Cut-Extrude34 (cut)
    with BuildSketch(Plane(origin=(0, 2.3622, 0), x_dir=(1, 0, 0), z_dir=(0, 1, 0))):
        with Locations((3.81, -58.547)):
            Rectangle(SKETCH38_W, SKETCH38_H)
    cut_extrude34 = extrude(amount=-CUT_EXTRUDE34_DEPTH, mode=Mode.SUBTRACT)

    # Mirror13: Cut-Extrude34 across plane
    add(cut_extrude34.mirror(Plane.XY), mode=Mode.SUBTRACT)

    # Sketch39 → Cut-Extrude35 (cut)
    with BuildSketch(Plane(origin=(0, 2.3622, 0), x_dir=(1, 0, 0), z_dir=(0, 1, 0))):
        with Locations((78.867, -48.514)):
            Rectangle(SKETCH39_W, SKETCH39_H)
    cut_extrude35 = extrude(amount=-CUT_EXTRUDE35_DEPTH, mode=Mode.SUBTRACT)

    # Mirror14: Cut-Extrude35 across plane
    add(cut_extrude35.mirror(Plane.XY), mode=Mode.SUBTRACT)

    # Mirror15: Cut-Extrude35 across plane
    add(cut_extrude35.mirror(Plane(origin=(3.81, 0, 0), x_dir=(0, 0, 1), z_dir=(1, 0, 0))), mode=Mode.SUBTRACT)

    # Mirror15 copy 1 sketch → Mirror15 copy 1 (cut)
    with BuildSketch(Plane(origin=(7.62, 2.3622, 0), x_dir=(-1, 0, 0), z_dir=(0, 1, 0))):
        with Locations((78.867, -48.514)):
            Rectangle(MIRROR15_COPY_1_SKETCH_W, MIRROR15_COPY_1_SKETCH_H)
    extrude(amount=-MIRROR15_COPY_1_DEPTH, mode=Mode.SUBTRACT)

    # Sketch13 → Cut-Extrude12 (cut, through all)
    with BuildSketch(Plane(origin=(0, 0, 0), x_dir=(-1, 0, 0), z_dir=(0, -1, 0))):
        with BuildLine():
            Line((60.052874771, -45.72), (60.052874771, -53.34))
            ThreePointArc((60.052874771, -53.34), (55.88, -57.512874771), (51.707125229, -53.34))
            Line((51.707125229, -53.34), (51.707125229, -45.72))
            ThreePointArc((51.707125229, -45.72), (55.88, -41.547125229), (60.052874771, -45.72))
        make_face()
        with BuildLine():
            Line((0.381, 49.403), (0.381, 41.783))
            ThreePointArc((0.381, 41.783), (-3.81, 37.592), (-8.001, 41.783))
            Line((-8.001, 41.783), (-8.001, 49.403))
            ThreePointArc((-8.001, 49.403), (-3.81, 53.594), (0.381, 49.403))
        make_face()
    cut_extrude12 = extrude(amount=-CUT_EXTRUDE12_DEPTH, mode=Mode.SUBTRACT)

    # Mirror16: Cut-Extrude12 across plane
    add(cut_extrude12.mirror(Plane.XY), mode=Mode.SUBTRACT)

    # Sketch40 → Boss-Extrude3 (add)
    with BuildSketch(Plane(origin=(0, 0, 60.96), x_dir=(-1, 0, 0), z_dir=(0, 0, -1))):
        with Locations((-3.81, 1.1811)):
            Rectangle(SKETCH40_W, SKETCH40_H)
    boss_extrude3 = extrude(amount=BOSS_EXTRUDE3_DEPTH)

    # Mirror17: Boss-Extrude3 across plane
    add(boss_extrude3.mirror(Plane.XY))

    # Fillet2
    fillet2_edges = [part.edges().sort_by_distance(p)[0] for p in [
        (83.82, 1.1811, -63.5),
        (-76.2, 1.1811, 63.5),
        (-76.2, 1.1811, -63.5),
        (83.82, 1.1811, 63.5),
    ]]
    fillet(fillet2_edges, radius=FILLET2_R)


solid = part.part
